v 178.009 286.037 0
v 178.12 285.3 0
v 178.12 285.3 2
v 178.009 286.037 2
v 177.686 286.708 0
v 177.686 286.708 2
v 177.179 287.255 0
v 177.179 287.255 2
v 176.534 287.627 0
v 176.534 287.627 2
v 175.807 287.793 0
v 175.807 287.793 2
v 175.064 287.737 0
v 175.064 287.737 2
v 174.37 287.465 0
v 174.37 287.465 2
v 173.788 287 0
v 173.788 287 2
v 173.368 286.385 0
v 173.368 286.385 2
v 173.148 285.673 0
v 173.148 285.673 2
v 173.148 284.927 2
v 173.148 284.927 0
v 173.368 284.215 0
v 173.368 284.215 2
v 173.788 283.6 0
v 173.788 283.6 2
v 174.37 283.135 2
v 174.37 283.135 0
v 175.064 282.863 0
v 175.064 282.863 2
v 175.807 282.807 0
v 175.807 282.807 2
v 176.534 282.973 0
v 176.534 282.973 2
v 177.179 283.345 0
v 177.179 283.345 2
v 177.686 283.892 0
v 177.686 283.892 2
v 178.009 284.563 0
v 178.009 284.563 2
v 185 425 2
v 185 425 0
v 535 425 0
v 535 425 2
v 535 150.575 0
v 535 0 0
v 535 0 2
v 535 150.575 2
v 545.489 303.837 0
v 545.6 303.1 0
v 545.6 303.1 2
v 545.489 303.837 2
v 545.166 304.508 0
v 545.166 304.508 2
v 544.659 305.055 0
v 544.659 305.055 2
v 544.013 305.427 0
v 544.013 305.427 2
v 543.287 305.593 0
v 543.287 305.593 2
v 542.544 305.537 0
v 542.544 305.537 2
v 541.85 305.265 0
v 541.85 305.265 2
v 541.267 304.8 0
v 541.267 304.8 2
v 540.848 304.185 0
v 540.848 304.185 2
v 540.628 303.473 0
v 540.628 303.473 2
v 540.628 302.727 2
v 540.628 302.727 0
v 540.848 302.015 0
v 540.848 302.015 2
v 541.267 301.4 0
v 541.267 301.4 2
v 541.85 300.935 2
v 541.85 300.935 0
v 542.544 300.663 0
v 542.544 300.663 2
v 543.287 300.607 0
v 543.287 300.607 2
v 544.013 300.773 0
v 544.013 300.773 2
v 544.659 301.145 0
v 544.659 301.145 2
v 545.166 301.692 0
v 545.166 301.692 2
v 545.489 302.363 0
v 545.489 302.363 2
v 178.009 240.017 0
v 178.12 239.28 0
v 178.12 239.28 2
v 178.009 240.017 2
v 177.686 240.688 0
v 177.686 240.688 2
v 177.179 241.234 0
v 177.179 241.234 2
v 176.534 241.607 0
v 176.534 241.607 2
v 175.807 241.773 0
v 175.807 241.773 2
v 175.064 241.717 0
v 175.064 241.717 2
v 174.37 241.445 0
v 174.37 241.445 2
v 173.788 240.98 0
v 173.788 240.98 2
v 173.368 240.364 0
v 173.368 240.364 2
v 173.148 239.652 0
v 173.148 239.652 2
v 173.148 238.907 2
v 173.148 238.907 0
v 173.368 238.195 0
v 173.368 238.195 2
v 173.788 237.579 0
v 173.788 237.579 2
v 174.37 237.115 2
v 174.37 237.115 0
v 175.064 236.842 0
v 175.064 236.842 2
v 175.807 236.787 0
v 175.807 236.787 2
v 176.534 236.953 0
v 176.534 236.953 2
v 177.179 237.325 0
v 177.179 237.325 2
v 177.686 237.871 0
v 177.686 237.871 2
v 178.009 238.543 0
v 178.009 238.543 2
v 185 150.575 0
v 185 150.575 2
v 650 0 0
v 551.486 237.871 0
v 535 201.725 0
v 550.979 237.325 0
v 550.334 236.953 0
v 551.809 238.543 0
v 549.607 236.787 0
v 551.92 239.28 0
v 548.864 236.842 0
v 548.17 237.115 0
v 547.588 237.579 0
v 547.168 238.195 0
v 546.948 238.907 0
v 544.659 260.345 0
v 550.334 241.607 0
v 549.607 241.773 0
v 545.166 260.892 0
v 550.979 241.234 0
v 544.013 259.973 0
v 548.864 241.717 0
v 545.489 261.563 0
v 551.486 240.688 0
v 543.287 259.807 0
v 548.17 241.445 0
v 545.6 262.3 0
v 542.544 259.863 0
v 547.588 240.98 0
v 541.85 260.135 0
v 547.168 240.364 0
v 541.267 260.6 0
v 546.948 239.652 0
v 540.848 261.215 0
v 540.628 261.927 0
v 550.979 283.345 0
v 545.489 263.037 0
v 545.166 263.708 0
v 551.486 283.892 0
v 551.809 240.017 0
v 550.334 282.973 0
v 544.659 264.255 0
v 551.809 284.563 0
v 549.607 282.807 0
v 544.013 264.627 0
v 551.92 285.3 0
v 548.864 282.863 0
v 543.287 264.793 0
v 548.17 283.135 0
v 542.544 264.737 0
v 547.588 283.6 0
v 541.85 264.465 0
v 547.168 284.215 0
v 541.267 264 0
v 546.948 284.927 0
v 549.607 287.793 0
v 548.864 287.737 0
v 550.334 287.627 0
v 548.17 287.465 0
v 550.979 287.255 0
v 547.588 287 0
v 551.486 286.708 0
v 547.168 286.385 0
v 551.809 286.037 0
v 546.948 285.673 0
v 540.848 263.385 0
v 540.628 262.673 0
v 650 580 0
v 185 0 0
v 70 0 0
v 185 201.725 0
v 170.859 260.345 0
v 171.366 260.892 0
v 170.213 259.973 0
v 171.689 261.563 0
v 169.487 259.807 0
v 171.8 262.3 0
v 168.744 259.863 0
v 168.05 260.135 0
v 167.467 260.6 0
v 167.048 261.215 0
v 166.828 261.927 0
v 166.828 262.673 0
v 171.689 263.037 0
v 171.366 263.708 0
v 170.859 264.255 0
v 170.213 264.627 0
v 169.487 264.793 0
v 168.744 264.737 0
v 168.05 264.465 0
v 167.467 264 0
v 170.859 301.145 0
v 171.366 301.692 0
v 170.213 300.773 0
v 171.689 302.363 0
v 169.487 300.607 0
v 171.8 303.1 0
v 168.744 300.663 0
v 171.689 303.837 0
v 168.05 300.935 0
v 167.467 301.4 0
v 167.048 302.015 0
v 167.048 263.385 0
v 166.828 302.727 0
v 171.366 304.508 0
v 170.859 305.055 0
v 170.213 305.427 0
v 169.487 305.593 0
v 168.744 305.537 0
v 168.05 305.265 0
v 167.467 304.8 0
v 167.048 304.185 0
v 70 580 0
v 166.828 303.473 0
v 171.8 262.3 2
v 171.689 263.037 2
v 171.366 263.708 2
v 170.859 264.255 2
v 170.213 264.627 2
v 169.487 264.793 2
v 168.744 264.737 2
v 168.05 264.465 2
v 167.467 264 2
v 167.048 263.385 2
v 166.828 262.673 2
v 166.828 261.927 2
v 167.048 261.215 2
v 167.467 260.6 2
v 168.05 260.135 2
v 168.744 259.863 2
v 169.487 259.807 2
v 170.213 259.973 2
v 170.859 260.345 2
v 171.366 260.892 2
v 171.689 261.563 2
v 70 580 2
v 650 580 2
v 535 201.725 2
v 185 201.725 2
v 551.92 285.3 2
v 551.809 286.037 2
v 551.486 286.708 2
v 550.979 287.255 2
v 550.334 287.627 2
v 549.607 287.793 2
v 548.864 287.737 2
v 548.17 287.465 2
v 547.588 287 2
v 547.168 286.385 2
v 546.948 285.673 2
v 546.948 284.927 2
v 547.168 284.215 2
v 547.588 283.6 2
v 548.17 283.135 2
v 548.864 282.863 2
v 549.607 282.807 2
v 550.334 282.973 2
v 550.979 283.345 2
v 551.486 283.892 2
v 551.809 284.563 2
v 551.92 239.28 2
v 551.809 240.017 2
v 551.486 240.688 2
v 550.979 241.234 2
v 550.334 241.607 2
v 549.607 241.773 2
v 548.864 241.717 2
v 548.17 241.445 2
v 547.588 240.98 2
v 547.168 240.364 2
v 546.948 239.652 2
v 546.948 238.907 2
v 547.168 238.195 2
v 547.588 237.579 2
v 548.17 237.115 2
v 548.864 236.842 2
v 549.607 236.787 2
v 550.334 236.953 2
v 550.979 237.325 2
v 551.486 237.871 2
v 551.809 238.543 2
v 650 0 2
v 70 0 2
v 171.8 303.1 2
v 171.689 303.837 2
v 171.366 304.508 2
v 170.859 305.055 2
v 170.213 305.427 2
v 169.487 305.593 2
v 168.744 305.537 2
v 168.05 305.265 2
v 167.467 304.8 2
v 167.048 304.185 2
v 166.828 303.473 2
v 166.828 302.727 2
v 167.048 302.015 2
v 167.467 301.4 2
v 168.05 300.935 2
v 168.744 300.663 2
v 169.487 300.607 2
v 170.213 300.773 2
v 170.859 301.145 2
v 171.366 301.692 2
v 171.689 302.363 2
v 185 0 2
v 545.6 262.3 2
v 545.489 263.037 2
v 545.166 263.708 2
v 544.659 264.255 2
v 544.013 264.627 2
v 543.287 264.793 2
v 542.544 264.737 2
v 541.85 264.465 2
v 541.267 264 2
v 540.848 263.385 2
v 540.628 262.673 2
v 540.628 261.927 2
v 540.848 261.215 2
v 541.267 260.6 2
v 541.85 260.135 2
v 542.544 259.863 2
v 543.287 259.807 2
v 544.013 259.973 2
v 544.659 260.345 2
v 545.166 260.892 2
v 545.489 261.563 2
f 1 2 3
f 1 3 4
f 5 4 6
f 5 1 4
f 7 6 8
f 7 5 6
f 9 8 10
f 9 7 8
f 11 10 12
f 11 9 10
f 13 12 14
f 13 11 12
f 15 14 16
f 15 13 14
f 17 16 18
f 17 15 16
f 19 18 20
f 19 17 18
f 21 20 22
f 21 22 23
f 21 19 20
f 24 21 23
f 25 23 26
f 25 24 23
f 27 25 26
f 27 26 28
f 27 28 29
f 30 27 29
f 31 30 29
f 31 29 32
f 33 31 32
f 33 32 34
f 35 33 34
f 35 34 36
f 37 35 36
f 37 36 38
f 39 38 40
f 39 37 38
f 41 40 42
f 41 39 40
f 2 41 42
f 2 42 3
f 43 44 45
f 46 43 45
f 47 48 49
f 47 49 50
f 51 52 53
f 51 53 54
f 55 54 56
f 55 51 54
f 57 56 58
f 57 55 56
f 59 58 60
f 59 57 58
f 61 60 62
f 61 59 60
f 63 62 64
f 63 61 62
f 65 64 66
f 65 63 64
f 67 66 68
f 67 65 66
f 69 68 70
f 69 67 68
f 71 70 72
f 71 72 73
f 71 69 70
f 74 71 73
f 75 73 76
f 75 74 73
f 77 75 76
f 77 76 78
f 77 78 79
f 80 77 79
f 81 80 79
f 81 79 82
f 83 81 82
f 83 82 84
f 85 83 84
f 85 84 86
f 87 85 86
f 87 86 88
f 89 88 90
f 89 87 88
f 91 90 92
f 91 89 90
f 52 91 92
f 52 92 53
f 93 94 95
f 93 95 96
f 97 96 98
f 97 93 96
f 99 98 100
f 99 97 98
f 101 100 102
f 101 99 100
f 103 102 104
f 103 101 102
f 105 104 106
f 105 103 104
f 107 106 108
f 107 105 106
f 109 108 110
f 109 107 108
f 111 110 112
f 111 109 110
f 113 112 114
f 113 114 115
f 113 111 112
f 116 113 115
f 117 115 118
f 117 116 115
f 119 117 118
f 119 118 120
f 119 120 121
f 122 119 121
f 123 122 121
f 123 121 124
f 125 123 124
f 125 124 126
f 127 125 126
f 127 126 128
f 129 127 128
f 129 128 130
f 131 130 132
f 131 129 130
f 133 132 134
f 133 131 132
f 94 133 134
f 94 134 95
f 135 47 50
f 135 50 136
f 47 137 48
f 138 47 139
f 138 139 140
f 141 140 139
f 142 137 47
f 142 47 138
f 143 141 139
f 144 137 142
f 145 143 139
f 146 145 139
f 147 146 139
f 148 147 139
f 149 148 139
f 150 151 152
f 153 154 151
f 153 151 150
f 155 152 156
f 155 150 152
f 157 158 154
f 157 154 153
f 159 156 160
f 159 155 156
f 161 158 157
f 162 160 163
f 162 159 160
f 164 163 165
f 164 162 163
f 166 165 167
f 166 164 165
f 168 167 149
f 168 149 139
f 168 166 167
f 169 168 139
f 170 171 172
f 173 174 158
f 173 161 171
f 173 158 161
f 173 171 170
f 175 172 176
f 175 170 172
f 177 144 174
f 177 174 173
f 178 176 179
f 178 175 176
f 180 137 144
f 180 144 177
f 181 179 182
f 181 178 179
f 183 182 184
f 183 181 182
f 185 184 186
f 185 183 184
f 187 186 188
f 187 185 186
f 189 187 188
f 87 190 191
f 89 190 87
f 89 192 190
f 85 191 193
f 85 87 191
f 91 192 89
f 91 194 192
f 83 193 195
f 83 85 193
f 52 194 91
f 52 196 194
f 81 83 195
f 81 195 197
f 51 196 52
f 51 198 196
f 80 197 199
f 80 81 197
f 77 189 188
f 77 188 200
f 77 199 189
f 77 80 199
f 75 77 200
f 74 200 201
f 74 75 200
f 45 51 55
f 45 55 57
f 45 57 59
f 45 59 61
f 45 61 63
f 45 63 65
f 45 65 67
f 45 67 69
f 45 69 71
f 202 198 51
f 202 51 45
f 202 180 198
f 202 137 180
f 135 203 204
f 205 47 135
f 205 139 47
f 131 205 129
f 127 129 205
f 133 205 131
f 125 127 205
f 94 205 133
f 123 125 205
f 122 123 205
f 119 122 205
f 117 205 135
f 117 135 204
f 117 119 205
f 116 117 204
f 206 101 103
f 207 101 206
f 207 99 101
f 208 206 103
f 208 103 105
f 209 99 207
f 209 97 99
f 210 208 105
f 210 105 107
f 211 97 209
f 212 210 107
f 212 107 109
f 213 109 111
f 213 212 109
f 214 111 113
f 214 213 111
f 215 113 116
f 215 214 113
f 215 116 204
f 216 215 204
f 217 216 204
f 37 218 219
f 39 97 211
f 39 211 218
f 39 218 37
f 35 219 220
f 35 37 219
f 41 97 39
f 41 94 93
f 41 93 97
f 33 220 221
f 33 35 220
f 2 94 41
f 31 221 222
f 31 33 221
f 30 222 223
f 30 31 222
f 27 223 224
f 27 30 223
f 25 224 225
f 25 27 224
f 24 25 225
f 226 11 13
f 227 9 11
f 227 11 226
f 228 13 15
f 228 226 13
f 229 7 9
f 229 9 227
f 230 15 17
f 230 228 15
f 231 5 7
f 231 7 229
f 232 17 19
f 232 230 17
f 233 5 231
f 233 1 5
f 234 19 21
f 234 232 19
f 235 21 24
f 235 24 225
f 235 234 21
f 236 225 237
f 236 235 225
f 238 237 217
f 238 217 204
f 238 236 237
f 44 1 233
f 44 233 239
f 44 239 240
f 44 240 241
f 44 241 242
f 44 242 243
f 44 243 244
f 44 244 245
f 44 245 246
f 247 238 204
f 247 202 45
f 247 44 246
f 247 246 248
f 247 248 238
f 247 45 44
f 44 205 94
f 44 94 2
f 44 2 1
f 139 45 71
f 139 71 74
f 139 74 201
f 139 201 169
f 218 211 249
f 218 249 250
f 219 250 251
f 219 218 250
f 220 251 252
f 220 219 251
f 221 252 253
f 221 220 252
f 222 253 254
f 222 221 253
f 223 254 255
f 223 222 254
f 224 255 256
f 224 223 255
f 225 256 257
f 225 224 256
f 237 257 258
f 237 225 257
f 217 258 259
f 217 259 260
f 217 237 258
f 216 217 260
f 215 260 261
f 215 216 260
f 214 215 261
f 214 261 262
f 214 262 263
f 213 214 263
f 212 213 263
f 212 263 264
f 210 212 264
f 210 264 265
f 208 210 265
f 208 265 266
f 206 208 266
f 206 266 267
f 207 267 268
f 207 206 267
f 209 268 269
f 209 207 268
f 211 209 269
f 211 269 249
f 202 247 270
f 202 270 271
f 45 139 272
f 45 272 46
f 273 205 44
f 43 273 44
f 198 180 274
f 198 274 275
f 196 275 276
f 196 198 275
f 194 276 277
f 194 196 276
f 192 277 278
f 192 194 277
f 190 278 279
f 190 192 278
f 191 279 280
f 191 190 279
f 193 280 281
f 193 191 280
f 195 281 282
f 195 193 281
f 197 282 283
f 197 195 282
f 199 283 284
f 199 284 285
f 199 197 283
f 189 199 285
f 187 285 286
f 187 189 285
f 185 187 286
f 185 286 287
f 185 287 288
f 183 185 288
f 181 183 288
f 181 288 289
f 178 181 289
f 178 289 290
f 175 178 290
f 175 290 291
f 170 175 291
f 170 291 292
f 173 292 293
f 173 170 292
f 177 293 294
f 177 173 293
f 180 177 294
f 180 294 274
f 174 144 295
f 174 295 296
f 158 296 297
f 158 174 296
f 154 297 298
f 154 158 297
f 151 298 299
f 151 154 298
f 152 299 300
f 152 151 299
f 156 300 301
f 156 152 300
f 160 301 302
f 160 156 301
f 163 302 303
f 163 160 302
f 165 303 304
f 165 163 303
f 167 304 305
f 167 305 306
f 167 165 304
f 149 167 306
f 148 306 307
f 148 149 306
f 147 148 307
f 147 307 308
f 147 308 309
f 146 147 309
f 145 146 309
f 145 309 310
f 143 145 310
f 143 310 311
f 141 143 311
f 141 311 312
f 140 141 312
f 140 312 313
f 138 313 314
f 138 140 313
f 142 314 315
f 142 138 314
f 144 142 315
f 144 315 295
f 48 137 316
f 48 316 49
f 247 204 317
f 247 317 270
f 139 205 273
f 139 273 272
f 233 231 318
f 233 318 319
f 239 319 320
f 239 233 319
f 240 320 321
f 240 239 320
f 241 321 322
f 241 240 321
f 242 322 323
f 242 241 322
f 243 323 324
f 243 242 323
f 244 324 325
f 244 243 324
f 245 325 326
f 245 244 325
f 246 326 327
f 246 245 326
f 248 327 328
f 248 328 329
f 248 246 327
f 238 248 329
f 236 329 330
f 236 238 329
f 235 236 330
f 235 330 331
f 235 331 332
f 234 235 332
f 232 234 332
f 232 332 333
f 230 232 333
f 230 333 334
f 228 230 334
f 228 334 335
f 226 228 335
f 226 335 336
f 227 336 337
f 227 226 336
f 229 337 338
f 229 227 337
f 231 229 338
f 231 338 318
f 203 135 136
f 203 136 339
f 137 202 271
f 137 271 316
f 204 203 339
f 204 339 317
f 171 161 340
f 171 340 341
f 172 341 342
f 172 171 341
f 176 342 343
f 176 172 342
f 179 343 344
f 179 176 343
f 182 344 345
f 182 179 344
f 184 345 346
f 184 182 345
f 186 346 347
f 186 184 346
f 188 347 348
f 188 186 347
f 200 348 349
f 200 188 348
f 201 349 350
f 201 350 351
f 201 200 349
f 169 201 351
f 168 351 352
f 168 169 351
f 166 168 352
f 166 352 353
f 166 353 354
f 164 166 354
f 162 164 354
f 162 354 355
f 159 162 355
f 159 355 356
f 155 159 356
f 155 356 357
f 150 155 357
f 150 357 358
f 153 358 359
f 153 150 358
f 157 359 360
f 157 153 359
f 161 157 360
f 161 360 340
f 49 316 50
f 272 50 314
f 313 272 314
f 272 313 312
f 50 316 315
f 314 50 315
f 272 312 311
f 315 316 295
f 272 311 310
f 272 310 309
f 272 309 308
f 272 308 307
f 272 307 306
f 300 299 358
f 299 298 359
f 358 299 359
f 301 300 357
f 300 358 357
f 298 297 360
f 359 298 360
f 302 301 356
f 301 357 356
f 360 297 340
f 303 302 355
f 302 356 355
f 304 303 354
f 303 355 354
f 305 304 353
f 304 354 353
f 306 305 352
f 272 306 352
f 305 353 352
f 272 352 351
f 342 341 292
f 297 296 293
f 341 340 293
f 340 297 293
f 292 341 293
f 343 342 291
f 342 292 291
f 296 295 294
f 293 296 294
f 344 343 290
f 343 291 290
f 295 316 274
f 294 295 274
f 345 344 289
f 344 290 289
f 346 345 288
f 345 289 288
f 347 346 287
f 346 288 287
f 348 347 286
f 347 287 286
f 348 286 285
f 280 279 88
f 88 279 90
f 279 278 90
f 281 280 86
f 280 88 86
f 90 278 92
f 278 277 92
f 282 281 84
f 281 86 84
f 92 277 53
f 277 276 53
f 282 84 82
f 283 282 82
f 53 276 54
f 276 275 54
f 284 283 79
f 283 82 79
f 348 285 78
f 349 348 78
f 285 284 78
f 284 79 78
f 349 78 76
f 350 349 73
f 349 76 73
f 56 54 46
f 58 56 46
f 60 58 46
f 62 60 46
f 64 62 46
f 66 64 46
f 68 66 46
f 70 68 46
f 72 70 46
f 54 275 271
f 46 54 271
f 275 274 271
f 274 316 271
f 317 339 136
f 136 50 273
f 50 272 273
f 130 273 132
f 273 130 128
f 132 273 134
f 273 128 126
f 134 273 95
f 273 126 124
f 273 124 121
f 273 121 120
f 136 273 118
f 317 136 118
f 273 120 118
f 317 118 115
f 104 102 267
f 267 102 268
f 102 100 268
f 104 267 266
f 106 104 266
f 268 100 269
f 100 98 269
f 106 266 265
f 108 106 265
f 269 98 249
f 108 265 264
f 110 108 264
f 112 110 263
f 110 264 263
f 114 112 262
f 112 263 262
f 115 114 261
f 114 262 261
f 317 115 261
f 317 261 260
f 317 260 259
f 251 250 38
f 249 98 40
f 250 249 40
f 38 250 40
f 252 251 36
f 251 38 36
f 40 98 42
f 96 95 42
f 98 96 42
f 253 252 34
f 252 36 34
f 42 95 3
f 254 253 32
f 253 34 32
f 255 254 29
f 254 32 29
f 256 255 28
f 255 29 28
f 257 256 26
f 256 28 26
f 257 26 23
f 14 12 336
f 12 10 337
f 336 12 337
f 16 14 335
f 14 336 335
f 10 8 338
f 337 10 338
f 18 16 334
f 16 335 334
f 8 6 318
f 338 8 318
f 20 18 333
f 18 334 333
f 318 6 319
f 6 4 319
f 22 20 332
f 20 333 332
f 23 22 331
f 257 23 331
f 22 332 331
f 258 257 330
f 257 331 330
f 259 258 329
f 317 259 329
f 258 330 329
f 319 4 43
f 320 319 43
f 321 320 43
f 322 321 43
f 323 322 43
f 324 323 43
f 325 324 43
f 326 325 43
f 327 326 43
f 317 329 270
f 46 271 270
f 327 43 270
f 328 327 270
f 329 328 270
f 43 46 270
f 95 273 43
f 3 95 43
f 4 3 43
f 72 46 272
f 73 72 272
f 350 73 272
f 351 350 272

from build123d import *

# Parameters (mm, degrees)
SKETCH_1_R      = 2.5
SKETCH_1_W      = 350
SKETCH_1_H      = 223.275
EXTRUDE_1_DEPTH = 2


with BuildPart() as part:
    # 草图1 → 凸台-拉伸1 (new body)
    with BuildSketch(Plane.XY):
        Polygon((70, 580), (650, 580), (650, 0), (535, 0), (535, 150.575), (185, 150.575), (185, 0), (70, 0), align=None)
        with Locations((175.620271067, 285.3)):
            Circle(SKETCH_1_R, mode=Mode.SUBTRACT)
        with Locations((175.620271067, 239.279728933)):
            Circle(SKETCH_1_R, mode=Mode.SUBTRACT)
        with Locations((169.3, 262.3)):
            Circle(SKETCH_1_R, mode=Mode.SUBTRACT)
        with Locations((169.3, 303.1)):
            Circle(SKETCH_1_R, mode=Mode.SUBTRACT)
        with Locations((549.420271067, 285.3)):
            Circle(SKETCH_1_R, mode=Mode.SUBTRACT)
        with Locations((549.420271067, 239.279728933)):
            Circle(SKETCH_1_R, mode=Mode.SUBTRACT)
        with Locations((543.1, 262.3)):
            Circle(SKETCH_1_R, mode=Mode.SUBTRACT)
        with Locations((543.1, 303.1)):
            Circle(SKETCH_1_R, mode=Mode.SUBTRACT)
        with Locations((360, 313.3625)):
            Rectangle(SKETCH_1_W, SKETCH_1_H, mode=Mode.SUBTRACT)
    extrude(amount=EXTRUDE_1_DEPTH)


solid = part.part
